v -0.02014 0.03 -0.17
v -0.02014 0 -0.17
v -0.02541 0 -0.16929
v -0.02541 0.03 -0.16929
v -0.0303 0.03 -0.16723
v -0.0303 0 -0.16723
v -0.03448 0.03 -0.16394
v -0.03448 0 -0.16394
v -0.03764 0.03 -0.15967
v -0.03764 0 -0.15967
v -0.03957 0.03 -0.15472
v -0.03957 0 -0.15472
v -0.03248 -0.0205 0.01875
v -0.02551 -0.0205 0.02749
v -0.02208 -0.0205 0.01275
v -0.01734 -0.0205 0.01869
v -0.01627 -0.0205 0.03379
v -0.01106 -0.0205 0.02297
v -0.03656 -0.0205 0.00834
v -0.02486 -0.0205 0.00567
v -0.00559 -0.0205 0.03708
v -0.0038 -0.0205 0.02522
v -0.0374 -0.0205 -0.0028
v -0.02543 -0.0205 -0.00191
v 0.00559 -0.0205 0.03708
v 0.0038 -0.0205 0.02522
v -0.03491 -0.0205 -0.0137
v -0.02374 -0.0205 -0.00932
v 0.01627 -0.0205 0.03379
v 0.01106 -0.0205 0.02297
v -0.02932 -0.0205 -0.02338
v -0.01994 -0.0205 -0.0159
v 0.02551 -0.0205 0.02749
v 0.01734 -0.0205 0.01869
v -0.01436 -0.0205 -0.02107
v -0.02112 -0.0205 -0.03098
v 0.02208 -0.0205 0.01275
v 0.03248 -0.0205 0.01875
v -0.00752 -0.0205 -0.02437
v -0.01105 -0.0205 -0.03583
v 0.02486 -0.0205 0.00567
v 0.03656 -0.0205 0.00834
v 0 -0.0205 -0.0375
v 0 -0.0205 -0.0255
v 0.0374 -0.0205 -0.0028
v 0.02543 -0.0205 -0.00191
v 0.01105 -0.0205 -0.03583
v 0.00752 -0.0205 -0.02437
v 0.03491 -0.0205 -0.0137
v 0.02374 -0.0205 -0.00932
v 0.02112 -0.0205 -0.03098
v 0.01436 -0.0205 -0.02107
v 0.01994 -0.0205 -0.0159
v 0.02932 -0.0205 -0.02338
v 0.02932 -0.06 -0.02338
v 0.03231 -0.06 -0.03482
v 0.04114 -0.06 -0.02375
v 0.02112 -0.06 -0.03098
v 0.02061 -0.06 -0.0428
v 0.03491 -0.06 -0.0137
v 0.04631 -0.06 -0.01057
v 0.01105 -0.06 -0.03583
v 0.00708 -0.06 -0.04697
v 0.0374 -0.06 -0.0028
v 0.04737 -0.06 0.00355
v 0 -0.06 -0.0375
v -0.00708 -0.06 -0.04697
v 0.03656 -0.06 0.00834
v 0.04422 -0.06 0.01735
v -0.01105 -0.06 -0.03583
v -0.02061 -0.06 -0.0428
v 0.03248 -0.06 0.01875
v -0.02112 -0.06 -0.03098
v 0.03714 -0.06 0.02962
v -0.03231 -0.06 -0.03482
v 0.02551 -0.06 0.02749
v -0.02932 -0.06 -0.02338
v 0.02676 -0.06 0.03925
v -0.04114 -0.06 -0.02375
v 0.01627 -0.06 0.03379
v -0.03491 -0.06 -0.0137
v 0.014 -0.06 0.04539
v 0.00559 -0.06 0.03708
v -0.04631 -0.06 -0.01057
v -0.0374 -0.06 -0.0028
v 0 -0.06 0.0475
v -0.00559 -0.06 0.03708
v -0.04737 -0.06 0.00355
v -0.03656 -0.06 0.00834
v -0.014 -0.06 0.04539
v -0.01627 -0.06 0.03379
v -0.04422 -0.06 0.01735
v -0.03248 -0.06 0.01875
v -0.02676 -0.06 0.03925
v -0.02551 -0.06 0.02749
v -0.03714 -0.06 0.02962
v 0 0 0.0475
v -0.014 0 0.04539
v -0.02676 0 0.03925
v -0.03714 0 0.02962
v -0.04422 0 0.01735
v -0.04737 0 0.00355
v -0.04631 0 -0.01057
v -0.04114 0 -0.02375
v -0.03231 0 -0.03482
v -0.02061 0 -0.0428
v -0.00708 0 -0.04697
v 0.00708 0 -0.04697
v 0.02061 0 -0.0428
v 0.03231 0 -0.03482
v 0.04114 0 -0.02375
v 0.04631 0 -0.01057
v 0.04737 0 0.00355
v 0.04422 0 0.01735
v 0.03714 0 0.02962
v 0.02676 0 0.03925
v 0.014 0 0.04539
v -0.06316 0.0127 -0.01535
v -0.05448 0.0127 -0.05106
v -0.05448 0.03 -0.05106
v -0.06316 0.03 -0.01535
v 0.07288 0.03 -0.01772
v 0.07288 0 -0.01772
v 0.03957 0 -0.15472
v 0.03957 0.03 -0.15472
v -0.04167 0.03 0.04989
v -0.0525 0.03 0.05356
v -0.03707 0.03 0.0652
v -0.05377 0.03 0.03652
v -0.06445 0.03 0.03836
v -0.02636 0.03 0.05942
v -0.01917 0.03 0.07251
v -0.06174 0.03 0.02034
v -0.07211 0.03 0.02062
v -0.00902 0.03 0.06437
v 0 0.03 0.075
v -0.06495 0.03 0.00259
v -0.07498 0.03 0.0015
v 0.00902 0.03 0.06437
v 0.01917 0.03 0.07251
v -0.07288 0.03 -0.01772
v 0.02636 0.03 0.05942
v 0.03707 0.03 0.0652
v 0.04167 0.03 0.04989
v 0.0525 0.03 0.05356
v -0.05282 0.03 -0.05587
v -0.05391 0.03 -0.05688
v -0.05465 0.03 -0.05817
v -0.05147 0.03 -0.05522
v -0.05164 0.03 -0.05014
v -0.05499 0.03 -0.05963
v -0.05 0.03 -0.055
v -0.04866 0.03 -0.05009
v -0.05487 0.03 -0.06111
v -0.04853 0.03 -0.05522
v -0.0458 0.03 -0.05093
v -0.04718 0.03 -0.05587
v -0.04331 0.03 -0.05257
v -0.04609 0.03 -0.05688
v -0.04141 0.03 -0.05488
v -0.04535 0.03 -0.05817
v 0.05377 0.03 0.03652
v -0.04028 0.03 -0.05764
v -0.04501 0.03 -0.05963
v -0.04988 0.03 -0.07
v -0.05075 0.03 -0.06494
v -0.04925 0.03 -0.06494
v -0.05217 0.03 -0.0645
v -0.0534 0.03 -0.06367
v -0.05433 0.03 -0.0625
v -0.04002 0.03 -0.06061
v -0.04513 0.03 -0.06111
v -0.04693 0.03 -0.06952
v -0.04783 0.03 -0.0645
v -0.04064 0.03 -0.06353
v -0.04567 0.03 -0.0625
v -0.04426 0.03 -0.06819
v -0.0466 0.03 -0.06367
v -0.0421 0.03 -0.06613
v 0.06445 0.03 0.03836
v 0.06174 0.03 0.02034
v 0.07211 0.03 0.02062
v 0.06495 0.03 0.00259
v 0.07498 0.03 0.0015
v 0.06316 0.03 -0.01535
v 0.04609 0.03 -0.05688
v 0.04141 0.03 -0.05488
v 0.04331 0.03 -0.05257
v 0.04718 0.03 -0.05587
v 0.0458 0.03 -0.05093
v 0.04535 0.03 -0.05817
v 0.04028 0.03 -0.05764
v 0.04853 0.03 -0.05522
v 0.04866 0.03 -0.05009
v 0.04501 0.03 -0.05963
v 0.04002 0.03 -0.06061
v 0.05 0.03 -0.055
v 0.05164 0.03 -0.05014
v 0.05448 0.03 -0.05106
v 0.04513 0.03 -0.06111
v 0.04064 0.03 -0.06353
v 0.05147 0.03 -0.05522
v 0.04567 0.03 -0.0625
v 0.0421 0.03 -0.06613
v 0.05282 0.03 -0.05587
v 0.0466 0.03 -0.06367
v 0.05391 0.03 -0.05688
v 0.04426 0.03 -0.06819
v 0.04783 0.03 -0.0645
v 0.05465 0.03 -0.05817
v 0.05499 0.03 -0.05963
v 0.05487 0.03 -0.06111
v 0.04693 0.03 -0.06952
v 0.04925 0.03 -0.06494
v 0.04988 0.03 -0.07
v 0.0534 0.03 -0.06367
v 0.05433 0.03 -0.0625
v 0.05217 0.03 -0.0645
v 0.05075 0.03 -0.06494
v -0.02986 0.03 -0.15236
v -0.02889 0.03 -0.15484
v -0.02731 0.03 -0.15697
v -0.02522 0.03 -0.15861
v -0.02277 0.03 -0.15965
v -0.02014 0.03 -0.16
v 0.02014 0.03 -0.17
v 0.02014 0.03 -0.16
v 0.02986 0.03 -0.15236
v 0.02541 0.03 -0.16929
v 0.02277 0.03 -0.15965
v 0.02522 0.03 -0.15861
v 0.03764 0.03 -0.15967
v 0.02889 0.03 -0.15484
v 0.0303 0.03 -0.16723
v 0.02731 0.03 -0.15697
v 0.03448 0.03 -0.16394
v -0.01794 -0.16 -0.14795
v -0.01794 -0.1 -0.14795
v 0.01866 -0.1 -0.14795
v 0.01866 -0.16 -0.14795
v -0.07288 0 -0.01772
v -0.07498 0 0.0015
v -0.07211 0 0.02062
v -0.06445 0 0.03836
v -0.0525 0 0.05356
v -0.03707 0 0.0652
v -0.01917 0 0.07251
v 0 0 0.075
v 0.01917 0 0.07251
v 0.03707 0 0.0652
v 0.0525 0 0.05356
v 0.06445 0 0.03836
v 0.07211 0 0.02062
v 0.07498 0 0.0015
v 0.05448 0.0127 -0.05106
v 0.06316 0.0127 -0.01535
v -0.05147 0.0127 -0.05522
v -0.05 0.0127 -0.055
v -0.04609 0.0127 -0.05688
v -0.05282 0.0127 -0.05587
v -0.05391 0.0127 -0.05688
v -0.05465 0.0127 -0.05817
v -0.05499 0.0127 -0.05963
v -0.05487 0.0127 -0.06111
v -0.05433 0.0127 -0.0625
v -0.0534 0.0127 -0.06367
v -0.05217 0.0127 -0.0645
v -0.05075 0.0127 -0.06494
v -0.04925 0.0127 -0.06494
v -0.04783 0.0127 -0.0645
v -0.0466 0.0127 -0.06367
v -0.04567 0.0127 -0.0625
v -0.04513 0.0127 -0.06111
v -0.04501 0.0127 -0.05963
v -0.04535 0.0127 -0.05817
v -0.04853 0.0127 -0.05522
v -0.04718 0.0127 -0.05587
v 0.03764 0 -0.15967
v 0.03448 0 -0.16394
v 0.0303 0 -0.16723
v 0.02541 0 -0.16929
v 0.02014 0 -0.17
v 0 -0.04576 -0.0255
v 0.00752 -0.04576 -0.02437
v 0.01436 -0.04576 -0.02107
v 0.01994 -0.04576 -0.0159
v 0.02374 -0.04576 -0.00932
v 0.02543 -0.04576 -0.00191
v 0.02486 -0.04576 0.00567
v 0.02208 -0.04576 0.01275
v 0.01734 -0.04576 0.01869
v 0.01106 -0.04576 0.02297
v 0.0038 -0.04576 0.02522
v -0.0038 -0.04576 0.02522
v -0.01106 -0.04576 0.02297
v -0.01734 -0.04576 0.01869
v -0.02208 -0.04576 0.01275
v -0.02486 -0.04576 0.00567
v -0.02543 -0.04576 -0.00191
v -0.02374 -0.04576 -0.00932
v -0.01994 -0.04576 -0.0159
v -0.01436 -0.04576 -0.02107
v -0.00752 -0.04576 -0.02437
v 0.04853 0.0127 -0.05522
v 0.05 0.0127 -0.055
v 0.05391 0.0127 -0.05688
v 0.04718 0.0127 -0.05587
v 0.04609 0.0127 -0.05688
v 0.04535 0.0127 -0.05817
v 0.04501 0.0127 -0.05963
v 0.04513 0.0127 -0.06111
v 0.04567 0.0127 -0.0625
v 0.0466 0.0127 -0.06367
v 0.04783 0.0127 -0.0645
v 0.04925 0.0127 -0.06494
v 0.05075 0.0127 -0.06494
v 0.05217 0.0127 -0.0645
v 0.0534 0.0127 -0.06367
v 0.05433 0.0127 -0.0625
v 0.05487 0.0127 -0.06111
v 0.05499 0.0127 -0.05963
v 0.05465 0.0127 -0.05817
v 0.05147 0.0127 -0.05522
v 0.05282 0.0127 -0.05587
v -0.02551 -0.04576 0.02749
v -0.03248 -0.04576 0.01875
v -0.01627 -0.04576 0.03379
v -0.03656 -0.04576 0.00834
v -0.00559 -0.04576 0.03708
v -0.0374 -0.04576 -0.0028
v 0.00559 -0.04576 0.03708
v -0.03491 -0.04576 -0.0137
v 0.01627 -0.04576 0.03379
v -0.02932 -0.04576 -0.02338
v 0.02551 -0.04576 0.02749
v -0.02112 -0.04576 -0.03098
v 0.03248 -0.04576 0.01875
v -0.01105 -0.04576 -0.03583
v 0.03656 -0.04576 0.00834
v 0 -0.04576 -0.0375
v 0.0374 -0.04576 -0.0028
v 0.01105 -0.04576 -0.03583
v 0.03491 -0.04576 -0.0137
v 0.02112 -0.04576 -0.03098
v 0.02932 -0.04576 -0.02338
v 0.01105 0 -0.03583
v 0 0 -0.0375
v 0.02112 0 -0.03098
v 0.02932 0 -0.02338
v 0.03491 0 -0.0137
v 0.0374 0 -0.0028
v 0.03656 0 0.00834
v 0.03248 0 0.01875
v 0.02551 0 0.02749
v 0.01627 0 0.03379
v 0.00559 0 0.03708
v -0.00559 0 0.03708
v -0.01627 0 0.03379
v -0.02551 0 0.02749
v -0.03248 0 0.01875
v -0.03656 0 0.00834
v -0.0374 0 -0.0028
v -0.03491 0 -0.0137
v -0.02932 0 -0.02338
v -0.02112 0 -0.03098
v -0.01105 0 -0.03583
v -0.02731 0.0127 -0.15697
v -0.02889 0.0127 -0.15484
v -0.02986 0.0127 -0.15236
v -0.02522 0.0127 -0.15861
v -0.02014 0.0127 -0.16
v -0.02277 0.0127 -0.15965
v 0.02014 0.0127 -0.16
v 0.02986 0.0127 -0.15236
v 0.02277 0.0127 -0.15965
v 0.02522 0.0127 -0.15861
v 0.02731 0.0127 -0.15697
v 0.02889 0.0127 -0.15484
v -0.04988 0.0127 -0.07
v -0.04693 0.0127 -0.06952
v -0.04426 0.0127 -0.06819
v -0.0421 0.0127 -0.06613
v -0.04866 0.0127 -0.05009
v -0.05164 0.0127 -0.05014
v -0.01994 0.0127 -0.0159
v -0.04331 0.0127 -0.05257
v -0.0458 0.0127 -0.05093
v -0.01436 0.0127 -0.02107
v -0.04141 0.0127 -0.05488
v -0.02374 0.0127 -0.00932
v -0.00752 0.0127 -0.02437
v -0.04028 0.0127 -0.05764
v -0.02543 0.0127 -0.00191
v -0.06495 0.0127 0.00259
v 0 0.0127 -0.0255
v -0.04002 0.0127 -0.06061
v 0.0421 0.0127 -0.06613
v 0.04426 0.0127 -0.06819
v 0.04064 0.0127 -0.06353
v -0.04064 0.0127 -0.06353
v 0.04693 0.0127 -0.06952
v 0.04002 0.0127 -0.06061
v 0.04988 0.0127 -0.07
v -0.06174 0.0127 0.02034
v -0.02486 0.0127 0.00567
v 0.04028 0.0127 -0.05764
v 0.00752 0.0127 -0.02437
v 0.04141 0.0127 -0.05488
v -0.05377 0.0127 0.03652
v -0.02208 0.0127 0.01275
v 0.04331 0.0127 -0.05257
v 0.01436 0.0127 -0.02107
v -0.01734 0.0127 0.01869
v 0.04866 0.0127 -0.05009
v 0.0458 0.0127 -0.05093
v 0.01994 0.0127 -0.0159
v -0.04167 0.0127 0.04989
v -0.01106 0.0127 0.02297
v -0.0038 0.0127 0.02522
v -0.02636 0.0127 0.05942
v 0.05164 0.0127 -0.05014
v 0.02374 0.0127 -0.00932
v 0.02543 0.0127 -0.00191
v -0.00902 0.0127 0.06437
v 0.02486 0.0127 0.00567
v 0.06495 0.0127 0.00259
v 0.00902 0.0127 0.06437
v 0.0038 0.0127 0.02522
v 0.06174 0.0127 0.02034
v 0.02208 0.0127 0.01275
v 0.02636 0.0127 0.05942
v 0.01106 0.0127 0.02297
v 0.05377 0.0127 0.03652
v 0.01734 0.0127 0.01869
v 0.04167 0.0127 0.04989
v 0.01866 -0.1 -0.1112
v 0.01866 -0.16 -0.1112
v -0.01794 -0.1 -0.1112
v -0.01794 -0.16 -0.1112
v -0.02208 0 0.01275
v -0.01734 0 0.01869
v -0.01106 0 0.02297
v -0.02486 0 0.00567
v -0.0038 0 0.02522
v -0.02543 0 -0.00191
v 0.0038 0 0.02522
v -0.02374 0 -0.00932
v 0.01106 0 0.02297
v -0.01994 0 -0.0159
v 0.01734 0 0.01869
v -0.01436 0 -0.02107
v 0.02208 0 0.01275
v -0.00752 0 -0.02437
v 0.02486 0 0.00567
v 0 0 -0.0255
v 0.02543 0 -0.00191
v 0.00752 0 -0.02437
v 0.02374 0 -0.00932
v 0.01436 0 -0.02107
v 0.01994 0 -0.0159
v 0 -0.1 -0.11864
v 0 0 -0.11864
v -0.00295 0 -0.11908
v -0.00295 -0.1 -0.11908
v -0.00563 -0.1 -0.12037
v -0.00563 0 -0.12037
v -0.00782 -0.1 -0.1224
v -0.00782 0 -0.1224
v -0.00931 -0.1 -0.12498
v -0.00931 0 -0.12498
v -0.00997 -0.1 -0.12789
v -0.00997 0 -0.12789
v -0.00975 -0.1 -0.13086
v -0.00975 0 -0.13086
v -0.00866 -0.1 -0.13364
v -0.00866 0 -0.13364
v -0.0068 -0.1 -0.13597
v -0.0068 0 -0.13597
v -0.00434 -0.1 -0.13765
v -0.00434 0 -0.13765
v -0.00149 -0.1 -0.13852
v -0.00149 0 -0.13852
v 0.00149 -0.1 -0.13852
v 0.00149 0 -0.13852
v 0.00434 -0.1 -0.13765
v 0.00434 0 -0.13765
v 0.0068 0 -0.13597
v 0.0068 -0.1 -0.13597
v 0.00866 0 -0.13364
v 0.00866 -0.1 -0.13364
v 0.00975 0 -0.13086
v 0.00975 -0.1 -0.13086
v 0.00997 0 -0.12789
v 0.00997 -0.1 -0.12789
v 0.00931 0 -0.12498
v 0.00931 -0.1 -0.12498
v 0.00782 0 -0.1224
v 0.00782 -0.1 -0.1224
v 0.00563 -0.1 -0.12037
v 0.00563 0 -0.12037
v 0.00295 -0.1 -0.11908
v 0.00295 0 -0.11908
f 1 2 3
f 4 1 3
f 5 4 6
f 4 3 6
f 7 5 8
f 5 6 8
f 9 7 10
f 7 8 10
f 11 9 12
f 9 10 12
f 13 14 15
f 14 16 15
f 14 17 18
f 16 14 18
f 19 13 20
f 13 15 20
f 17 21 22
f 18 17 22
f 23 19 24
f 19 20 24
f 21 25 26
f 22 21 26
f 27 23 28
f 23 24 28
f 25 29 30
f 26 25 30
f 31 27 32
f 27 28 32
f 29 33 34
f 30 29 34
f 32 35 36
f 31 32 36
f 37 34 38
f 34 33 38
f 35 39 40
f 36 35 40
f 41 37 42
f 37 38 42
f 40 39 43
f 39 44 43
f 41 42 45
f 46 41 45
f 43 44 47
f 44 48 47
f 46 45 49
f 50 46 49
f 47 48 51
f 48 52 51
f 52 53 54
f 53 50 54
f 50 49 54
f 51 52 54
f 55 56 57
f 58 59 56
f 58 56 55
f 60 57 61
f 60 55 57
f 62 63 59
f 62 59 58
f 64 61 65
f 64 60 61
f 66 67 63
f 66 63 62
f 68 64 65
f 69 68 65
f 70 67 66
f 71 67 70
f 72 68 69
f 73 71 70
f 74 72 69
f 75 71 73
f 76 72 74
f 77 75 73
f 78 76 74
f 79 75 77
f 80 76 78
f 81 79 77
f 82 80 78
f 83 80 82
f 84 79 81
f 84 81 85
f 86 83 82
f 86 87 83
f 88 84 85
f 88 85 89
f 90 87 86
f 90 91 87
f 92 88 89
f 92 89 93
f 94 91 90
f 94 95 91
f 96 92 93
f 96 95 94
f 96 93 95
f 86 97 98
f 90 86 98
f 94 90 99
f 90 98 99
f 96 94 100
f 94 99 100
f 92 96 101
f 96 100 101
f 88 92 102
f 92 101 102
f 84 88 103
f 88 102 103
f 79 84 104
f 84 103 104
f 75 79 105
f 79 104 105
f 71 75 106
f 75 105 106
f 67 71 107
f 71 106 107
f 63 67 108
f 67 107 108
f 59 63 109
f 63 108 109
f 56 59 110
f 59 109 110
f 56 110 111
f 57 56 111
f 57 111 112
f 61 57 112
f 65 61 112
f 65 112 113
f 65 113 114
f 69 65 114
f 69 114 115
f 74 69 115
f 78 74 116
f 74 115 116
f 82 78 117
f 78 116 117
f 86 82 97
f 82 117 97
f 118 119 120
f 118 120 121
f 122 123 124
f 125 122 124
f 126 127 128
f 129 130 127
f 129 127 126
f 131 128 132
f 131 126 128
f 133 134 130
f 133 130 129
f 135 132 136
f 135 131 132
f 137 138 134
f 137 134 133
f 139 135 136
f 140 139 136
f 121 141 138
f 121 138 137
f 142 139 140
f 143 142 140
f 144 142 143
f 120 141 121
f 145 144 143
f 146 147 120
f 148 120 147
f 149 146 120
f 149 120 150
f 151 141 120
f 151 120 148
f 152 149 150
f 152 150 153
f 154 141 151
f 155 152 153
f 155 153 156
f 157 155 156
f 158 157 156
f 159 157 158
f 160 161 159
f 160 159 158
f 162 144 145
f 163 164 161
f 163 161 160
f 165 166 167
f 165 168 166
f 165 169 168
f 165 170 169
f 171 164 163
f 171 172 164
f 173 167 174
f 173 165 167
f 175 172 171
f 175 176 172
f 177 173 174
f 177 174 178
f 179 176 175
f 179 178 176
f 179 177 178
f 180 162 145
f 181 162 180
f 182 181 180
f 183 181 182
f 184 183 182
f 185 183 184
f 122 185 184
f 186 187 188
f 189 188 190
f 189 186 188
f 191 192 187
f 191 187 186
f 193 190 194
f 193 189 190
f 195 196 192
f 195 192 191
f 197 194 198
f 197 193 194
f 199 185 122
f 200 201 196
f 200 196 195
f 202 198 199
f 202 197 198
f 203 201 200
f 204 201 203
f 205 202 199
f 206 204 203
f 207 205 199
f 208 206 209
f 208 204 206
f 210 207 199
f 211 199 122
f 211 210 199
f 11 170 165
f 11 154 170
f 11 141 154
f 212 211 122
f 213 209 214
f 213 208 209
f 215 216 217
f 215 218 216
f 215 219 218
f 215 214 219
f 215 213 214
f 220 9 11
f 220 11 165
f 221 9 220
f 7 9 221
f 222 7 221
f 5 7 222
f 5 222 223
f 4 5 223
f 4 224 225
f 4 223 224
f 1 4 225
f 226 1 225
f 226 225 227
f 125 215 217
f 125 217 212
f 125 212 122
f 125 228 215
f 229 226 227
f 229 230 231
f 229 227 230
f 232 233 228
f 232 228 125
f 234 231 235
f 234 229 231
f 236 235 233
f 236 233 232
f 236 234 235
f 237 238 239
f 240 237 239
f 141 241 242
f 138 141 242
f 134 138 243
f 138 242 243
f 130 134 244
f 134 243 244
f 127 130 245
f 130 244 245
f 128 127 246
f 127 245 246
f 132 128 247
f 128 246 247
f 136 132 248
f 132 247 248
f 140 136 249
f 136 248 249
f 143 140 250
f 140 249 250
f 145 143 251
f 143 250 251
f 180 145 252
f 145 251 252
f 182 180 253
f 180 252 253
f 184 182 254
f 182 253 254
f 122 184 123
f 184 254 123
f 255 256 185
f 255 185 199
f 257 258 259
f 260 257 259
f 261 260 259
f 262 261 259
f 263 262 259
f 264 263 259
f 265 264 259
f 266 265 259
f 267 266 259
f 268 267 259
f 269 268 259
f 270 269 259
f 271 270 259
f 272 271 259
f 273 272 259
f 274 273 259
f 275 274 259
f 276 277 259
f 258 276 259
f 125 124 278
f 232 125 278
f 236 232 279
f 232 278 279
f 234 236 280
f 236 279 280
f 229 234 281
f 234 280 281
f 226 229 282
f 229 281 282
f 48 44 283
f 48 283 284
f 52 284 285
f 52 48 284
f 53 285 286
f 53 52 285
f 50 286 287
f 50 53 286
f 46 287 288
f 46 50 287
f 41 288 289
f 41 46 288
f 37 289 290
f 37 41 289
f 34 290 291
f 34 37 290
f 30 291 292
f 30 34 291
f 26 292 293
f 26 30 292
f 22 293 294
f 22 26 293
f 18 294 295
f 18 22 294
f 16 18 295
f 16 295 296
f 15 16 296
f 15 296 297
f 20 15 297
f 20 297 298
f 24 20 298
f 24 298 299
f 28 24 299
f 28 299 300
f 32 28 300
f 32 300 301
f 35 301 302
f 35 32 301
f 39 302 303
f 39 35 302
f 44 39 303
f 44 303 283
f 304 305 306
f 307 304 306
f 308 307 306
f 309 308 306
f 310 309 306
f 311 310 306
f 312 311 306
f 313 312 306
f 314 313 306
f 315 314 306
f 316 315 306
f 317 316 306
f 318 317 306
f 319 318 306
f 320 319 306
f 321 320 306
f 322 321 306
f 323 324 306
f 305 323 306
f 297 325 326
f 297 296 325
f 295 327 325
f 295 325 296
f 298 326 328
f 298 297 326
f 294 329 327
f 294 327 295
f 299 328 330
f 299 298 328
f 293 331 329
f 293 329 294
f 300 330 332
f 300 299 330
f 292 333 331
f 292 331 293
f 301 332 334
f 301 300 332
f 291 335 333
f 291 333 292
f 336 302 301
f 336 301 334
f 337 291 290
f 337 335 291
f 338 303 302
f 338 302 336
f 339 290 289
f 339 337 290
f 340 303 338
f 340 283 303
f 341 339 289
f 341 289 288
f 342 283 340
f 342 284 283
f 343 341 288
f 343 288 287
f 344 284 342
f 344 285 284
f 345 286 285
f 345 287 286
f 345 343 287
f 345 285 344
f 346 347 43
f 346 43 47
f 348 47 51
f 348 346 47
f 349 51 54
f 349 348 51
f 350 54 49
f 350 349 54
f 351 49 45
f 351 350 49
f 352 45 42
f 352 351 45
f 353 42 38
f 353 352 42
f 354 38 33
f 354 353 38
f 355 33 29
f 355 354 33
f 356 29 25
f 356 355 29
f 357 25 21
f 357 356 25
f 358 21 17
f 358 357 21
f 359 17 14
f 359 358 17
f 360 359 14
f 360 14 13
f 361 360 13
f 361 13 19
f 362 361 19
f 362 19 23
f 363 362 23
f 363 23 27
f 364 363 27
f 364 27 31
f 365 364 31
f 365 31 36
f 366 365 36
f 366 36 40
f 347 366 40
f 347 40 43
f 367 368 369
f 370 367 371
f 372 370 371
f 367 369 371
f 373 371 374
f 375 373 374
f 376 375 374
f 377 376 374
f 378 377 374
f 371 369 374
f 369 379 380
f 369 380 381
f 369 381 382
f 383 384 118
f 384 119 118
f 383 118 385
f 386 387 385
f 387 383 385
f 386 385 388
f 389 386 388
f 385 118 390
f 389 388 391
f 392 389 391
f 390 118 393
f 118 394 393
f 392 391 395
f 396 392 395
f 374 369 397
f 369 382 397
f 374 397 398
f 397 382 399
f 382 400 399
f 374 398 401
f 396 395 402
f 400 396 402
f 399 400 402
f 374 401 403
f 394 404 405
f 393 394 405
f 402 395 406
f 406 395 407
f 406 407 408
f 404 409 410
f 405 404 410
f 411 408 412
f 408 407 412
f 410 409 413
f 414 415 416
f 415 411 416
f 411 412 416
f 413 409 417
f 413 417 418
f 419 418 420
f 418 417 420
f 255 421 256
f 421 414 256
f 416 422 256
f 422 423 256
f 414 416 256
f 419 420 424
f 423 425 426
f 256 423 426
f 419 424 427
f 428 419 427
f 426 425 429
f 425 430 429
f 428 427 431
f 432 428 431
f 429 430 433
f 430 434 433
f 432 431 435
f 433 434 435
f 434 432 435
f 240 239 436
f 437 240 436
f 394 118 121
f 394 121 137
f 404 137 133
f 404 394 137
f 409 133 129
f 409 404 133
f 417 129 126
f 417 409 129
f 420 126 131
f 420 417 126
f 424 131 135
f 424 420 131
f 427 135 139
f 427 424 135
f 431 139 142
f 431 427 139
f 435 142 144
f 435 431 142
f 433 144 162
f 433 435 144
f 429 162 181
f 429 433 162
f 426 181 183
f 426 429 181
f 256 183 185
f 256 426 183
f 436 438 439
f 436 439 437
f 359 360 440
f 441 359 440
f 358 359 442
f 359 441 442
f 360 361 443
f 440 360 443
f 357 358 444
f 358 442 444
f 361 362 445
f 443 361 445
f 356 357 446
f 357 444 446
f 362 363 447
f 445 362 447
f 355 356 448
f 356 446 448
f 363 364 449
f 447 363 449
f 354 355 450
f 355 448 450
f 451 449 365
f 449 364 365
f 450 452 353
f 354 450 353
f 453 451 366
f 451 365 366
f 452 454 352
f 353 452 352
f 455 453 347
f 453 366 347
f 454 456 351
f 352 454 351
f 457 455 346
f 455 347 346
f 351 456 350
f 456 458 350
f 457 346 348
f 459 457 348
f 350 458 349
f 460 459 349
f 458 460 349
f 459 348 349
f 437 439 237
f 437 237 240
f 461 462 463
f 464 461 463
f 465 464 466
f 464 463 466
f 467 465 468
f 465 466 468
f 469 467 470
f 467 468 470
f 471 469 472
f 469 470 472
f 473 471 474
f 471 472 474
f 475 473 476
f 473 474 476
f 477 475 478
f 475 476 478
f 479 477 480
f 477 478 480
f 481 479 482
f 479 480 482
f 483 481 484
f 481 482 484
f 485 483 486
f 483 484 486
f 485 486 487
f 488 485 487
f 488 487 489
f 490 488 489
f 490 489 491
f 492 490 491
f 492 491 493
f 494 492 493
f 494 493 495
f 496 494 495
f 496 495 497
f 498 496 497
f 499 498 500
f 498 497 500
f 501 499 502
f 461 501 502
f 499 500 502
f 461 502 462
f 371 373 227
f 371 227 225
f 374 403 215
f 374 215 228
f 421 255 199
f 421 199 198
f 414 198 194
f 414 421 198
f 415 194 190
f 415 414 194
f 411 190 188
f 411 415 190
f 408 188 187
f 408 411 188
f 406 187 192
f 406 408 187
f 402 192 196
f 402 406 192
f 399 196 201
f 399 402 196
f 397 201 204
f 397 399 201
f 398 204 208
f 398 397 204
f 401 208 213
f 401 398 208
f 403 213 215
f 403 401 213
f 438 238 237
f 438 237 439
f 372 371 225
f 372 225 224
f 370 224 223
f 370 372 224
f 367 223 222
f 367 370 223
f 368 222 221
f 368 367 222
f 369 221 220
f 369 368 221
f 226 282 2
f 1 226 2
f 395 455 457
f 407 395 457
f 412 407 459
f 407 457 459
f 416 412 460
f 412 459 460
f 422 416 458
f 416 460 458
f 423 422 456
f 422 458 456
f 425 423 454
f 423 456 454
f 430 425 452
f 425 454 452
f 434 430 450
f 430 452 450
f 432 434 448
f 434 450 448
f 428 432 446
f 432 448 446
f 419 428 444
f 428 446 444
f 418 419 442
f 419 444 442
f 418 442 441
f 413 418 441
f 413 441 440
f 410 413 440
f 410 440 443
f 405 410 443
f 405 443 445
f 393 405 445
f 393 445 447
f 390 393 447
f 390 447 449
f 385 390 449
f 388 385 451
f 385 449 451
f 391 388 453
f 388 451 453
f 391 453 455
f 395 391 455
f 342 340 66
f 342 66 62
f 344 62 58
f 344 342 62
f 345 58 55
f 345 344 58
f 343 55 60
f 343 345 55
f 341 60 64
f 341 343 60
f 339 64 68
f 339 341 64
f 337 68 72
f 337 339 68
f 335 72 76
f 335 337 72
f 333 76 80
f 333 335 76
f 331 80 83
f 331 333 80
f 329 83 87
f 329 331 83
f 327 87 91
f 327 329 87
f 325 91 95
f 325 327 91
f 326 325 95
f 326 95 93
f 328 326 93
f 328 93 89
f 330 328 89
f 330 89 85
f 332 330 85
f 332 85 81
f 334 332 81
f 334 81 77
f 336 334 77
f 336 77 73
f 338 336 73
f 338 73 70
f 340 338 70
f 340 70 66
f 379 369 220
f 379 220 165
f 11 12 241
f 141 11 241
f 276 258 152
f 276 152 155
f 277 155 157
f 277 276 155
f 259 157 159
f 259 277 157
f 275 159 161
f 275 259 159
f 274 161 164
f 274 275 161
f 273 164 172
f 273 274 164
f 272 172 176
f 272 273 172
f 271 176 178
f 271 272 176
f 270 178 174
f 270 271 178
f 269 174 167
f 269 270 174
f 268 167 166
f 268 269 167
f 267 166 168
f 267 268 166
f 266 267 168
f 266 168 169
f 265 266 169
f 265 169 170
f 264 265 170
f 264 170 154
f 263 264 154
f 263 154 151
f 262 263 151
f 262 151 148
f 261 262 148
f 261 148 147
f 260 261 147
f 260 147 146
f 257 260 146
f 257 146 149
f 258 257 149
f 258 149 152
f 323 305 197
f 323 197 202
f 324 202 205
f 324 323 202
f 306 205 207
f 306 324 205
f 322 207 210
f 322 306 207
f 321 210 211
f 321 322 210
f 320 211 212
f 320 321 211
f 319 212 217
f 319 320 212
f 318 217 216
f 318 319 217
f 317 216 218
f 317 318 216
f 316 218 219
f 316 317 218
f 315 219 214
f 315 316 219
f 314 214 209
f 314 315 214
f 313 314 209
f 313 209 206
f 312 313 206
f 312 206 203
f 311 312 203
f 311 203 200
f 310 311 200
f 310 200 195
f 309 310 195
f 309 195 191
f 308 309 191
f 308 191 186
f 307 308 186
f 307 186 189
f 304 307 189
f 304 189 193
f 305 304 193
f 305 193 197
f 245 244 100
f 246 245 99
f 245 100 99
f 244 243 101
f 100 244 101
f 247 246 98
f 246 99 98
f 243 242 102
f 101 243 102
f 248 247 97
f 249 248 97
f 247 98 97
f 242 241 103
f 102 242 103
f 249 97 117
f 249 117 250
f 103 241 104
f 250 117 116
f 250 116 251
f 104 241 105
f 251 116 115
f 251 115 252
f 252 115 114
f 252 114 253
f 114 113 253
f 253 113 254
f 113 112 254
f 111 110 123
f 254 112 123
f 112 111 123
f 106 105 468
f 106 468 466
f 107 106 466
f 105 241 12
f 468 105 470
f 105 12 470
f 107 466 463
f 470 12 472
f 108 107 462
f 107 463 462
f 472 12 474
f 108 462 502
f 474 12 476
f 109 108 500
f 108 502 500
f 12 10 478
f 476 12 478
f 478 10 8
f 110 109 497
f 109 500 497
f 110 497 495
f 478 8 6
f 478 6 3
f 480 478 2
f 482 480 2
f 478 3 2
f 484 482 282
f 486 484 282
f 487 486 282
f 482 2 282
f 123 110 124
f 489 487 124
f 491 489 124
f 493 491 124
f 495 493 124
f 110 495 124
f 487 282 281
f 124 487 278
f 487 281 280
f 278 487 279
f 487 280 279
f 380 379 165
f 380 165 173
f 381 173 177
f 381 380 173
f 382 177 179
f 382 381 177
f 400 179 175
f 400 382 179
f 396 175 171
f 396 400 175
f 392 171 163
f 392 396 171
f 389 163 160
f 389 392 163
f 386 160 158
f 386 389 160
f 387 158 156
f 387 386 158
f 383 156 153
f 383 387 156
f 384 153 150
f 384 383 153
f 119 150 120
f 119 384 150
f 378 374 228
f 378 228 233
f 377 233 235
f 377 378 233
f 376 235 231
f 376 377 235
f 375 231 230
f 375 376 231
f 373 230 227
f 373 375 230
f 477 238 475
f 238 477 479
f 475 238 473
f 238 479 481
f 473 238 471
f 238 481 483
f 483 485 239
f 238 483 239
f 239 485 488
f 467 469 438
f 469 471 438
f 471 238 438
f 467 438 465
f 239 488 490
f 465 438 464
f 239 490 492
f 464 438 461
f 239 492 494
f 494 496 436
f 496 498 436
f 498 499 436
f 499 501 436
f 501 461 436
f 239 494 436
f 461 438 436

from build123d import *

# Parameters (mm, degrees)
SKETCH1_R           = 0.005
BOSS_EXTRUDE1_DEPTH = 0.03
SKETCH6_R           = 0.0255
BOSS_EXTRUDE5_DEPTH = 0.0127
SKETCH7_R           = 0.0475
SKETCH7_R_2         = 0.0375
BOSS_EXTRUDE6_DEPTH = 0.06
SKETCH8_R           = 0.0375
SKETCH8_R_2         = 0.0255
BOSS_EXTRUDE7_DEPTH = 0.02526
SKETCH9_R           = 0.01
BOSS_EXTRUDE8_DEPTH = 0.1
SKETCH10_W          = 0.036599462
SKETCH10_H          = 0.036757143
BOSS_EXTRUDE9_DEPTH = 0.06


with BuildPart() as part:
    # Sketch1 → Boss-Extrude1 (new body)
    with BuildSketch(Plane(origin=(0, 0, 0), x_dir=(1, 0, 0), z_dir=(0, 1, 0))):
        with BuildLine():
            Line((-0.039573681, 0.154724036), (-0.072877802, 0.017715135))
            ThreePointArc((-0.072877802, 0.017715135), (0, -0.075), (0.072877802, 0.017715135))
            Line((0.072877802, 0.017715135), (0.039573681, 0.154724036))
            ThreePointArc((0.039573681, 0.154724036), (0.032499197, 0.165723879), (0.0201396, 0.17))
            Line((0.0201396, 0.17), (-0.0201396, 0.17))
            ThreePointArc((-0.0201396, 0.17), (-0.032499197, 0.165723879), (-0.039573681, 0.154724036))
        make_face()
        with Locations(Location((-0.05, 0.06, 0), (0, 0, 270))):
            Circle(SKETCH1_R, mode=Mode.SUBTRACT)
        with Locations(Location((0.05, 0.06, 0), (0, 0, 270))):
            Circle(SKETCH1_R, mode=Mode.SUBTRACT)
        with BuildLine():
            Line((0.0201396, 0.16), (-0.0201396, 0.16))
            ThreePointArc((-0.0201396, 0.16), (-0.026319399, 0.157861939), (-0.029856641, 0.152362018))
            Line((-0.029856641, 0.152362018), (-0.049877381, 0.069999248))
            ThreePointArc((-0.049877381, 0.069999248), (-0.04028296, 0.057637982), (-0.054481083, 0.051060207))
            Line((-0.054481083, 0.051060207), (-0.063160762, 0.015353117))
            ThreePointArc((-0.063160762, 0.015353117), (0, -0.065), (0.063160762, 0.015353117))
            Line((0.063160762, 0.015353117), (0.054481083, 0.051060207))
            ThreePointArc((0.054481083, 0.051060207), (0.04028296, 0.057637982), (0.049877381, 0.069999248))
            Line((0.049877381, 0.069999248), (0.029856641, 0.152362018))
            ThreePointArc((0.029856641, 0.152362018), (0.026319399, 0.157861939), (0.0201396, 0.16))
        make_face(mode=Mode.SUBTRACT)
    extrude(amount=BOSS_EXTRUDE1_DEPTH)

    # Sketch6 → Boss-Extrude5 (add)
    with BuildSketch(Plane.XZ):
        with BuildLine():
            Line((-0.0201396, -0.17), (0.0201396, -0.17))
            ThreePointArc((0.0201396, -0.17), (0.032499197, -0.165723879), (0.039573681, -0.154724036))
            Line((0.039573681, -0.154724036), (0.072877802, -0.017715135))
            ThreePointArc((0.072877802, -0.017715135), (0, 0.075), (-0.072877802, -0.017715135))
            Line((-0.072877802, -0.017715135), (-0.039573681, -0.154724036))
            ThreePointArc((-0.039573681, -0.154724036), (-0.032499197, -0.165723879), (-0.0201396, -0.17))
        make_face()
        with Locations(Location((0, 0, 0), (0, 0, 270))):
            Circle(SKETCH6_R, mode=Mode.SUBTRACT)
    extrude(amount=-BOSS_EXTRUDE5_DEPTH)

    # Sketch7 → Boss-Extrude6 (add)
    with BuildSketch(Plane.XZ):
        with Locations(Location((0, 0, 0), (0, 0, 90))):
            Circle(SKETCH7_R)
        with Locations(Location((0, 0, 0), (0, 0, 270))):
            Circle(SKETCH7_R_2, mode=Mode.SUBTRACT)
    extrude(amount=BOSS_EXTRUDE6_DEPTH)

    # Sketch8 → Boss-Extrude7 (add)
    with BuildSketch(Plane(origin=(0, -0.0205, 0), x_dir=(-1, 0, 0), z_dir=(0, -1, 0))):
        with Locations(Location((0, 0, 0), (0, 0, 90))):
            Circle(SKETCH8_R)
        with Locations(Location((0, 0, 0), (0, 0, 90))):
            Circle(SKETCH8_R_2, mode=Mode.SUBTRACT)
    extrude(amount=BOSS_EXTRUDE7_DEPTH)

    # Sketch9 → Boss-Extrude8 (add)
    with BuildSketch(Plane.XZ):
        with Locations(Location((0, -0.128635749, 0), (0, 0, 90))):
            Circle(SKETCH9_R)
    extrude(amount=BOSS_EXTRUDE8_DEPTH)

    # Sketch10 → Boss-Extrude9 (add)
    with BuildSketch(Plane.XZ.offset(0.1)):
        with Locations((0.00036003, -0.129574617)):
            Rectangle(SKETCH10_W, SKETCH10_H)
    extrude(amount=BOSS_EXTRUDE9_DEPTH)


solid = part.part
